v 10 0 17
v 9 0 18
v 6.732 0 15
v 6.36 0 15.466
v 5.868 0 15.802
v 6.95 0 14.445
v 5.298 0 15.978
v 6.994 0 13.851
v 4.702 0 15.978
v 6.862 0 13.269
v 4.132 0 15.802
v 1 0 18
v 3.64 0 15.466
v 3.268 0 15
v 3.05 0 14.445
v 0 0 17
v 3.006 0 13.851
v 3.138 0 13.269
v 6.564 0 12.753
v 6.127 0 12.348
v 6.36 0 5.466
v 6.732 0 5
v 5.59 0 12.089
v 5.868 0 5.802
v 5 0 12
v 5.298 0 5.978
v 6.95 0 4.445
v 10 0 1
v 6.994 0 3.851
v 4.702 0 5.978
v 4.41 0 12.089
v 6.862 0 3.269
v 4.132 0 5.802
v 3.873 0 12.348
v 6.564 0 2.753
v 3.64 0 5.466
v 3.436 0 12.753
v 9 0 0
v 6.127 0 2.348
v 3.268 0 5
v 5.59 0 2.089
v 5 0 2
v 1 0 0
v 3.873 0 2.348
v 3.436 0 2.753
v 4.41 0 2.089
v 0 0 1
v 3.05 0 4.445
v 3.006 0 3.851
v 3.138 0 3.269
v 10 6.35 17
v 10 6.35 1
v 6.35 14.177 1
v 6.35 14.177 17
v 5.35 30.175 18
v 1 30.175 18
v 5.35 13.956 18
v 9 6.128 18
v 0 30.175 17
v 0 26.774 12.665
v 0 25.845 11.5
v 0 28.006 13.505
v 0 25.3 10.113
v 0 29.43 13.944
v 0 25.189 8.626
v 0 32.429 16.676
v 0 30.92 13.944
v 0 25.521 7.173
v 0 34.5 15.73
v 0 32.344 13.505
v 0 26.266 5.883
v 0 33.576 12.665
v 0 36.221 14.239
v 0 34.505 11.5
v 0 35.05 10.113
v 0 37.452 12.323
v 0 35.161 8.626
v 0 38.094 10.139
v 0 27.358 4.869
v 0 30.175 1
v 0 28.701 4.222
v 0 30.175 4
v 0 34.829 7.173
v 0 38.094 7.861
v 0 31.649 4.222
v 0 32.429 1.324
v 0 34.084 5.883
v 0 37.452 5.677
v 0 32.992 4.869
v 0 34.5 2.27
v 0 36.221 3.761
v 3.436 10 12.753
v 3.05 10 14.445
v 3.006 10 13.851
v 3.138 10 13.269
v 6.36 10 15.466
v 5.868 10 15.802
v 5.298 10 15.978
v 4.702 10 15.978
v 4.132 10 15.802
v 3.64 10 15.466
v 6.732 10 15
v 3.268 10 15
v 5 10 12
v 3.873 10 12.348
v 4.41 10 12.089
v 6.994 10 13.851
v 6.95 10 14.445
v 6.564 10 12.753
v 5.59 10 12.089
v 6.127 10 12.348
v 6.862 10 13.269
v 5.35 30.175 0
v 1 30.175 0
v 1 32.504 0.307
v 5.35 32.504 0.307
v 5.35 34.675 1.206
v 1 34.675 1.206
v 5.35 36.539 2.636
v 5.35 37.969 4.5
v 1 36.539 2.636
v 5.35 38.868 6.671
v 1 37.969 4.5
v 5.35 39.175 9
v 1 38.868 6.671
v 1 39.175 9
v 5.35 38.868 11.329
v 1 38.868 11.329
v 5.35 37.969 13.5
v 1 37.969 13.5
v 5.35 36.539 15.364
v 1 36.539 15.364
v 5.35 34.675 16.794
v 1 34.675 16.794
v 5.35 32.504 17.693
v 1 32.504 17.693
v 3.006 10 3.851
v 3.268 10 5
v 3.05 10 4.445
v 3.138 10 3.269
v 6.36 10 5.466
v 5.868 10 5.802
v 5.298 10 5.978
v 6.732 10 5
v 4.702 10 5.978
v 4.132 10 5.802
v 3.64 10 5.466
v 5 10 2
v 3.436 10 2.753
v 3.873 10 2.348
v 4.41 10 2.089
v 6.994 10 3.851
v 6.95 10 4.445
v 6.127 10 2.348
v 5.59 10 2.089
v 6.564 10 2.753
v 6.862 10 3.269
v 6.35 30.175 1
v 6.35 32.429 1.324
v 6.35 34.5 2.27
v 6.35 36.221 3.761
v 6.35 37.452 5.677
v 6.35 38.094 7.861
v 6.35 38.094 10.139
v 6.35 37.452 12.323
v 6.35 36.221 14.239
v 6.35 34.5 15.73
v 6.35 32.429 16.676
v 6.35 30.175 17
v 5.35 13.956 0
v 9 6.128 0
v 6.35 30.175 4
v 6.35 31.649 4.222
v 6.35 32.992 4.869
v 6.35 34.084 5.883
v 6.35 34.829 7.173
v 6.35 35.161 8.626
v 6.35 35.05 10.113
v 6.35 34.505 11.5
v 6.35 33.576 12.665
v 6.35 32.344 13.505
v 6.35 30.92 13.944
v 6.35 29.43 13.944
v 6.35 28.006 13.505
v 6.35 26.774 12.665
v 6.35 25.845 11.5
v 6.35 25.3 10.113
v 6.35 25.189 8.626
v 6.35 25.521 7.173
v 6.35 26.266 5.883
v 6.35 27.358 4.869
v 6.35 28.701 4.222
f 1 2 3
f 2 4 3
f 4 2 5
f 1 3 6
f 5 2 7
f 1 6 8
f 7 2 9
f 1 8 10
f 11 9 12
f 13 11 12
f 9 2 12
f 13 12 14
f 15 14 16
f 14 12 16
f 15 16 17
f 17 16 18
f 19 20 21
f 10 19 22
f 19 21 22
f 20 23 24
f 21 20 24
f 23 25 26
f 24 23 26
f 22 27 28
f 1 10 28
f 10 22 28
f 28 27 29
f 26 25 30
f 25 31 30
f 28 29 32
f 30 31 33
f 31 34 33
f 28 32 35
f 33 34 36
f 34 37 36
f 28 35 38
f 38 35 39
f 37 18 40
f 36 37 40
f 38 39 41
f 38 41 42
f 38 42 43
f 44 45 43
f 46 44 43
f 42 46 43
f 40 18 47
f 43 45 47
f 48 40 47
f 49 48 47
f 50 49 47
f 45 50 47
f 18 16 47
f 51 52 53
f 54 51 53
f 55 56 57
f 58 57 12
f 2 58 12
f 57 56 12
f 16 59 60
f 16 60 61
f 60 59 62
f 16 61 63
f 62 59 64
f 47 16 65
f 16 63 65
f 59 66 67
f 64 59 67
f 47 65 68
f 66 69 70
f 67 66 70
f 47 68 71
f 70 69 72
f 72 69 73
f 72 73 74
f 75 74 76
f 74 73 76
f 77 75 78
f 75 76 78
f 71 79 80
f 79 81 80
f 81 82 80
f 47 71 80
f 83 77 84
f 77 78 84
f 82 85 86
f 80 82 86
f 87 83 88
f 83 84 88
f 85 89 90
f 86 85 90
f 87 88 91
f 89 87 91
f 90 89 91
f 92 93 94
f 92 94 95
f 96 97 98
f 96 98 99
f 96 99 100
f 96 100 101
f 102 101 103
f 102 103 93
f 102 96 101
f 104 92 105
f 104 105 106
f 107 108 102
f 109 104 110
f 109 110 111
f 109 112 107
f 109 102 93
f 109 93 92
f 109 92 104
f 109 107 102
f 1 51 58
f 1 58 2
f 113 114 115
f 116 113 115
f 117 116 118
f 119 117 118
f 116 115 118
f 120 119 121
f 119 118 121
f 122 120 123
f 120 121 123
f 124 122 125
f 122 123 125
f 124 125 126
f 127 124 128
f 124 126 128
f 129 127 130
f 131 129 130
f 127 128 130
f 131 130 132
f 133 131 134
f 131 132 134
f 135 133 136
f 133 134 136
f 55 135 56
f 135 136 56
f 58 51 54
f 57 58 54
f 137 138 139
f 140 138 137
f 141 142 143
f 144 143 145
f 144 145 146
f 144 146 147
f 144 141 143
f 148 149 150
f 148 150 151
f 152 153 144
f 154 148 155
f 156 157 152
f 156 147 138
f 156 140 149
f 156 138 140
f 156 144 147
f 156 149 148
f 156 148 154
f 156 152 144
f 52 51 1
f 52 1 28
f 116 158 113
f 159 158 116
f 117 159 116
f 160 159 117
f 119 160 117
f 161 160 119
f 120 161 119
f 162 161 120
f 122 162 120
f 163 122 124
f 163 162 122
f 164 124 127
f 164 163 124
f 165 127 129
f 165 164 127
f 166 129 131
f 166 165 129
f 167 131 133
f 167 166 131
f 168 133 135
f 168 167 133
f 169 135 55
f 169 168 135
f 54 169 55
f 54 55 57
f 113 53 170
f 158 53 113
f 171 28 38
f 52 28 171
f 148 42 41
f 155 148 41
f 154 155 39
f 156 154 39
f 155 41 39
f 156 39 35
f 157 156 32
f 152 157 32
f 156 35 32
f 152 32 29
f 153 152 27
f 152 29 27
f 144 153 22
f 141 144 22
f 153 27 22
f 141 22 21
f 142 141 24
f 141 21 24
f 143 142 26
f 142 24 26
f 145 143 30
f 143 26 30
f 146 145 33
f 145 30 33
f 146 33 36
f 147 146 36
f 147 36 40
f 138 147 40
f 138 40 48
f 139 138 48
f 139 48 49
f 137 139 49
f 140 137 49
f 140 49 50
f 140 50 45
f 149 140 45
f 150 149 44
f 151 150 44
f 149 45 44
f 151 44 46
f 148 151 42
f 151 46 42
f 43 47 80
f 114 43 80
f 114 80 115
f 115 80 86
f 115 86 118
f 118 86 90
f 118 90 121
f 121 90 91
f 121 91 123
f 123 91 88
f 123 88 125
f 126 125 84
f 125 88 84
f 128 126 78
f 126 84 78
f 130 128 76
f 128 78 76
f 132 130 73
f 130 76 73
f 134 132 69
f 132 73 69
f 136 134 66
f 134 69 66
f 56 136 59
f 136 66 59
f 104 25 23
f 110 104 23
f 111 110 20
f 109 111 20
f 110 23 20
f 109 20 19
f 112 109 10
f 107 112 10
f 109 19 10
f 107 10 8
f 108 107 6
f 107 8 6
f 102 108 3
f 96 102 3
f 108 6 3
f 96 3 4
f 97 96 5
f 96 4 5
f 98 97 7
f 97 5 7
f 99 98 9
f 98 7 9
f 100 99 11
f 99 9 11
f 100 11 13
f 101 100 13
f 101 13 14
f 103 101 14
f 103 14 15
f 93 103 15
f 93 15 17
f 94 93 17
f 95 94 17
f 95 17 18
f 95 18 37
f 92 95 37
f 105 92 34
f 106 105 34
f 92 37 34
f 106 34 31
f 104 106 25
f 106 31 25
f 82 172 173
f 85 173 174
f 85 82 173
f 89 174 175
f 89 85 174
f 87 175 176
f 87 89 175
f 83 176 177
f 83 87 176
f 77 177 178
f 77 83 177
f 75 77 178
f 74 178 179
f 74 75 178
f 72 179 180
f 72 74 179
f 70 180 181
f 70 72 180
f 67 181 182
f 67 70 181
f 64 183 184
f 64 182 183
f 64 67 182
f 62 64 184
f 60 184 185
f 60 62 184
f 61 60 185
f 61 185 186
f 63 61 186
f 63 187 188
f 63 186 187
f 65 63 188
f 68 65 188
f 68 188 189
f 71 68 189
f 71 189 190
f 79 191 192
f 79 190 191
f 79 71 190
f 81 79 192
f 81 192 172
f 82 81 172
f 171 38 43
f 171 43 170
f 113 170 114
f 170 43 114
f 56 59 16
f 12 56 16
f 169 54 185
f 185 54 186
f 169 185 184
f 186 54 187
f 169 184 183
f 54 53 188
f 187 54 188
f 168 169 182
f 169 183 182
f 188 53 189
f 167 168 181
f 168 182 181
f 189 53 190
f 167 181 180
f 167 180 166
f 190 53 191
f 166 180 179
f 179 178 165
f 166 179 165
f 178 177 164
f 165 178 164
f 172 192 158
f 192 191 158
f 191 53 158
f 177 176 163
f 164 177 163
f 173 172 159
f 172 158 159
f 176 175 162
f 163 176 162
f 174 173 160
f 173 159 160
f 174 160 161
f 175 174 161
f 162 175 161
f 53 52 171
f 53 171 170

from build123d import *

# Parameters (mm, degrees)
SKETCH1_R           = 5
BOSS_EXTRUDE1_DEPTH = 10
SKETCH2_R           = 2
CUT_EXTRUDE1_DEPTH  = 10
CUT_EXTRUDE2_DEPTH  = 24
CHAMFER1_SIZE       = 1


with BuildPart() as part:
    # Sketch1 → Boss-Extrude1 (new body)
    with BuildSketch(Plane(origin=(0, 0, 0), x_dir=(0, 0, -1), z_dir=(1, 0, 0))):
        with BuildLine():
            Line((-18, 30.175), (-18, 0))
            Line((-18, 0), (0, 0))
            Line((0, 0), (0, 30.175))
            ThreePointArc((0, 30.175), (-9, 39.175), (-18, 30.175))
        make_face()
        with Locations((-9, 30.175)):
            Circle(SKETCH1_R, mode=Mode.SUBTRACT)
    extrude(amount=BOSS_EXTRUDE1_DEPTH)

    # Sketch2 → Cut-Extrude1 (cut)
    with BuildSketch(Plane.XZ):
        with Locations(Location((5, 4, 0), (0, 0, 270))):
            Circle(SKETCH2_R)
        with Locations(Location((5, 14, 0), (0, 0, 270))):
            Circle(SKETCH2_R)
    extrude(amount=-CUT_EXTRUDE1_DEPTH, mode=Mode.SUBTRACT)

    # Sketch3 → Cut-Extrude2 (cut)
    with BuildSketch(Plane.XY):
        Polygon((10, 6.35), (6.35, 14.17745026), (6.35, 39.175), (10, 39.175), align=None)
    extrude(amount=CUT_EXTRUDE2_DEPTH, mode=Mode.SUBTRACT)

    # Chamfer1
    chamfer1_edges = [part.edges().sort_by_distance(p)[0] for p in [
        (10, 3.175, 0),
        (10, 3.175, 18),
        (8.175, 10.26372513, 0),
        (6.35, 22.17622513, 0),
        (6.35, 39.175, 9),
        (6.35, 22.17622513, 18),
        (8.175, 10.26372513, 18),
        (0, 15.0875, 0),
        (0, 15.0875, 18),
        (0, 39.175, 9),
    ]]
    chamfer(chamfer1_edges, length=CHAMFER1_SIZE)


solid = part.part
